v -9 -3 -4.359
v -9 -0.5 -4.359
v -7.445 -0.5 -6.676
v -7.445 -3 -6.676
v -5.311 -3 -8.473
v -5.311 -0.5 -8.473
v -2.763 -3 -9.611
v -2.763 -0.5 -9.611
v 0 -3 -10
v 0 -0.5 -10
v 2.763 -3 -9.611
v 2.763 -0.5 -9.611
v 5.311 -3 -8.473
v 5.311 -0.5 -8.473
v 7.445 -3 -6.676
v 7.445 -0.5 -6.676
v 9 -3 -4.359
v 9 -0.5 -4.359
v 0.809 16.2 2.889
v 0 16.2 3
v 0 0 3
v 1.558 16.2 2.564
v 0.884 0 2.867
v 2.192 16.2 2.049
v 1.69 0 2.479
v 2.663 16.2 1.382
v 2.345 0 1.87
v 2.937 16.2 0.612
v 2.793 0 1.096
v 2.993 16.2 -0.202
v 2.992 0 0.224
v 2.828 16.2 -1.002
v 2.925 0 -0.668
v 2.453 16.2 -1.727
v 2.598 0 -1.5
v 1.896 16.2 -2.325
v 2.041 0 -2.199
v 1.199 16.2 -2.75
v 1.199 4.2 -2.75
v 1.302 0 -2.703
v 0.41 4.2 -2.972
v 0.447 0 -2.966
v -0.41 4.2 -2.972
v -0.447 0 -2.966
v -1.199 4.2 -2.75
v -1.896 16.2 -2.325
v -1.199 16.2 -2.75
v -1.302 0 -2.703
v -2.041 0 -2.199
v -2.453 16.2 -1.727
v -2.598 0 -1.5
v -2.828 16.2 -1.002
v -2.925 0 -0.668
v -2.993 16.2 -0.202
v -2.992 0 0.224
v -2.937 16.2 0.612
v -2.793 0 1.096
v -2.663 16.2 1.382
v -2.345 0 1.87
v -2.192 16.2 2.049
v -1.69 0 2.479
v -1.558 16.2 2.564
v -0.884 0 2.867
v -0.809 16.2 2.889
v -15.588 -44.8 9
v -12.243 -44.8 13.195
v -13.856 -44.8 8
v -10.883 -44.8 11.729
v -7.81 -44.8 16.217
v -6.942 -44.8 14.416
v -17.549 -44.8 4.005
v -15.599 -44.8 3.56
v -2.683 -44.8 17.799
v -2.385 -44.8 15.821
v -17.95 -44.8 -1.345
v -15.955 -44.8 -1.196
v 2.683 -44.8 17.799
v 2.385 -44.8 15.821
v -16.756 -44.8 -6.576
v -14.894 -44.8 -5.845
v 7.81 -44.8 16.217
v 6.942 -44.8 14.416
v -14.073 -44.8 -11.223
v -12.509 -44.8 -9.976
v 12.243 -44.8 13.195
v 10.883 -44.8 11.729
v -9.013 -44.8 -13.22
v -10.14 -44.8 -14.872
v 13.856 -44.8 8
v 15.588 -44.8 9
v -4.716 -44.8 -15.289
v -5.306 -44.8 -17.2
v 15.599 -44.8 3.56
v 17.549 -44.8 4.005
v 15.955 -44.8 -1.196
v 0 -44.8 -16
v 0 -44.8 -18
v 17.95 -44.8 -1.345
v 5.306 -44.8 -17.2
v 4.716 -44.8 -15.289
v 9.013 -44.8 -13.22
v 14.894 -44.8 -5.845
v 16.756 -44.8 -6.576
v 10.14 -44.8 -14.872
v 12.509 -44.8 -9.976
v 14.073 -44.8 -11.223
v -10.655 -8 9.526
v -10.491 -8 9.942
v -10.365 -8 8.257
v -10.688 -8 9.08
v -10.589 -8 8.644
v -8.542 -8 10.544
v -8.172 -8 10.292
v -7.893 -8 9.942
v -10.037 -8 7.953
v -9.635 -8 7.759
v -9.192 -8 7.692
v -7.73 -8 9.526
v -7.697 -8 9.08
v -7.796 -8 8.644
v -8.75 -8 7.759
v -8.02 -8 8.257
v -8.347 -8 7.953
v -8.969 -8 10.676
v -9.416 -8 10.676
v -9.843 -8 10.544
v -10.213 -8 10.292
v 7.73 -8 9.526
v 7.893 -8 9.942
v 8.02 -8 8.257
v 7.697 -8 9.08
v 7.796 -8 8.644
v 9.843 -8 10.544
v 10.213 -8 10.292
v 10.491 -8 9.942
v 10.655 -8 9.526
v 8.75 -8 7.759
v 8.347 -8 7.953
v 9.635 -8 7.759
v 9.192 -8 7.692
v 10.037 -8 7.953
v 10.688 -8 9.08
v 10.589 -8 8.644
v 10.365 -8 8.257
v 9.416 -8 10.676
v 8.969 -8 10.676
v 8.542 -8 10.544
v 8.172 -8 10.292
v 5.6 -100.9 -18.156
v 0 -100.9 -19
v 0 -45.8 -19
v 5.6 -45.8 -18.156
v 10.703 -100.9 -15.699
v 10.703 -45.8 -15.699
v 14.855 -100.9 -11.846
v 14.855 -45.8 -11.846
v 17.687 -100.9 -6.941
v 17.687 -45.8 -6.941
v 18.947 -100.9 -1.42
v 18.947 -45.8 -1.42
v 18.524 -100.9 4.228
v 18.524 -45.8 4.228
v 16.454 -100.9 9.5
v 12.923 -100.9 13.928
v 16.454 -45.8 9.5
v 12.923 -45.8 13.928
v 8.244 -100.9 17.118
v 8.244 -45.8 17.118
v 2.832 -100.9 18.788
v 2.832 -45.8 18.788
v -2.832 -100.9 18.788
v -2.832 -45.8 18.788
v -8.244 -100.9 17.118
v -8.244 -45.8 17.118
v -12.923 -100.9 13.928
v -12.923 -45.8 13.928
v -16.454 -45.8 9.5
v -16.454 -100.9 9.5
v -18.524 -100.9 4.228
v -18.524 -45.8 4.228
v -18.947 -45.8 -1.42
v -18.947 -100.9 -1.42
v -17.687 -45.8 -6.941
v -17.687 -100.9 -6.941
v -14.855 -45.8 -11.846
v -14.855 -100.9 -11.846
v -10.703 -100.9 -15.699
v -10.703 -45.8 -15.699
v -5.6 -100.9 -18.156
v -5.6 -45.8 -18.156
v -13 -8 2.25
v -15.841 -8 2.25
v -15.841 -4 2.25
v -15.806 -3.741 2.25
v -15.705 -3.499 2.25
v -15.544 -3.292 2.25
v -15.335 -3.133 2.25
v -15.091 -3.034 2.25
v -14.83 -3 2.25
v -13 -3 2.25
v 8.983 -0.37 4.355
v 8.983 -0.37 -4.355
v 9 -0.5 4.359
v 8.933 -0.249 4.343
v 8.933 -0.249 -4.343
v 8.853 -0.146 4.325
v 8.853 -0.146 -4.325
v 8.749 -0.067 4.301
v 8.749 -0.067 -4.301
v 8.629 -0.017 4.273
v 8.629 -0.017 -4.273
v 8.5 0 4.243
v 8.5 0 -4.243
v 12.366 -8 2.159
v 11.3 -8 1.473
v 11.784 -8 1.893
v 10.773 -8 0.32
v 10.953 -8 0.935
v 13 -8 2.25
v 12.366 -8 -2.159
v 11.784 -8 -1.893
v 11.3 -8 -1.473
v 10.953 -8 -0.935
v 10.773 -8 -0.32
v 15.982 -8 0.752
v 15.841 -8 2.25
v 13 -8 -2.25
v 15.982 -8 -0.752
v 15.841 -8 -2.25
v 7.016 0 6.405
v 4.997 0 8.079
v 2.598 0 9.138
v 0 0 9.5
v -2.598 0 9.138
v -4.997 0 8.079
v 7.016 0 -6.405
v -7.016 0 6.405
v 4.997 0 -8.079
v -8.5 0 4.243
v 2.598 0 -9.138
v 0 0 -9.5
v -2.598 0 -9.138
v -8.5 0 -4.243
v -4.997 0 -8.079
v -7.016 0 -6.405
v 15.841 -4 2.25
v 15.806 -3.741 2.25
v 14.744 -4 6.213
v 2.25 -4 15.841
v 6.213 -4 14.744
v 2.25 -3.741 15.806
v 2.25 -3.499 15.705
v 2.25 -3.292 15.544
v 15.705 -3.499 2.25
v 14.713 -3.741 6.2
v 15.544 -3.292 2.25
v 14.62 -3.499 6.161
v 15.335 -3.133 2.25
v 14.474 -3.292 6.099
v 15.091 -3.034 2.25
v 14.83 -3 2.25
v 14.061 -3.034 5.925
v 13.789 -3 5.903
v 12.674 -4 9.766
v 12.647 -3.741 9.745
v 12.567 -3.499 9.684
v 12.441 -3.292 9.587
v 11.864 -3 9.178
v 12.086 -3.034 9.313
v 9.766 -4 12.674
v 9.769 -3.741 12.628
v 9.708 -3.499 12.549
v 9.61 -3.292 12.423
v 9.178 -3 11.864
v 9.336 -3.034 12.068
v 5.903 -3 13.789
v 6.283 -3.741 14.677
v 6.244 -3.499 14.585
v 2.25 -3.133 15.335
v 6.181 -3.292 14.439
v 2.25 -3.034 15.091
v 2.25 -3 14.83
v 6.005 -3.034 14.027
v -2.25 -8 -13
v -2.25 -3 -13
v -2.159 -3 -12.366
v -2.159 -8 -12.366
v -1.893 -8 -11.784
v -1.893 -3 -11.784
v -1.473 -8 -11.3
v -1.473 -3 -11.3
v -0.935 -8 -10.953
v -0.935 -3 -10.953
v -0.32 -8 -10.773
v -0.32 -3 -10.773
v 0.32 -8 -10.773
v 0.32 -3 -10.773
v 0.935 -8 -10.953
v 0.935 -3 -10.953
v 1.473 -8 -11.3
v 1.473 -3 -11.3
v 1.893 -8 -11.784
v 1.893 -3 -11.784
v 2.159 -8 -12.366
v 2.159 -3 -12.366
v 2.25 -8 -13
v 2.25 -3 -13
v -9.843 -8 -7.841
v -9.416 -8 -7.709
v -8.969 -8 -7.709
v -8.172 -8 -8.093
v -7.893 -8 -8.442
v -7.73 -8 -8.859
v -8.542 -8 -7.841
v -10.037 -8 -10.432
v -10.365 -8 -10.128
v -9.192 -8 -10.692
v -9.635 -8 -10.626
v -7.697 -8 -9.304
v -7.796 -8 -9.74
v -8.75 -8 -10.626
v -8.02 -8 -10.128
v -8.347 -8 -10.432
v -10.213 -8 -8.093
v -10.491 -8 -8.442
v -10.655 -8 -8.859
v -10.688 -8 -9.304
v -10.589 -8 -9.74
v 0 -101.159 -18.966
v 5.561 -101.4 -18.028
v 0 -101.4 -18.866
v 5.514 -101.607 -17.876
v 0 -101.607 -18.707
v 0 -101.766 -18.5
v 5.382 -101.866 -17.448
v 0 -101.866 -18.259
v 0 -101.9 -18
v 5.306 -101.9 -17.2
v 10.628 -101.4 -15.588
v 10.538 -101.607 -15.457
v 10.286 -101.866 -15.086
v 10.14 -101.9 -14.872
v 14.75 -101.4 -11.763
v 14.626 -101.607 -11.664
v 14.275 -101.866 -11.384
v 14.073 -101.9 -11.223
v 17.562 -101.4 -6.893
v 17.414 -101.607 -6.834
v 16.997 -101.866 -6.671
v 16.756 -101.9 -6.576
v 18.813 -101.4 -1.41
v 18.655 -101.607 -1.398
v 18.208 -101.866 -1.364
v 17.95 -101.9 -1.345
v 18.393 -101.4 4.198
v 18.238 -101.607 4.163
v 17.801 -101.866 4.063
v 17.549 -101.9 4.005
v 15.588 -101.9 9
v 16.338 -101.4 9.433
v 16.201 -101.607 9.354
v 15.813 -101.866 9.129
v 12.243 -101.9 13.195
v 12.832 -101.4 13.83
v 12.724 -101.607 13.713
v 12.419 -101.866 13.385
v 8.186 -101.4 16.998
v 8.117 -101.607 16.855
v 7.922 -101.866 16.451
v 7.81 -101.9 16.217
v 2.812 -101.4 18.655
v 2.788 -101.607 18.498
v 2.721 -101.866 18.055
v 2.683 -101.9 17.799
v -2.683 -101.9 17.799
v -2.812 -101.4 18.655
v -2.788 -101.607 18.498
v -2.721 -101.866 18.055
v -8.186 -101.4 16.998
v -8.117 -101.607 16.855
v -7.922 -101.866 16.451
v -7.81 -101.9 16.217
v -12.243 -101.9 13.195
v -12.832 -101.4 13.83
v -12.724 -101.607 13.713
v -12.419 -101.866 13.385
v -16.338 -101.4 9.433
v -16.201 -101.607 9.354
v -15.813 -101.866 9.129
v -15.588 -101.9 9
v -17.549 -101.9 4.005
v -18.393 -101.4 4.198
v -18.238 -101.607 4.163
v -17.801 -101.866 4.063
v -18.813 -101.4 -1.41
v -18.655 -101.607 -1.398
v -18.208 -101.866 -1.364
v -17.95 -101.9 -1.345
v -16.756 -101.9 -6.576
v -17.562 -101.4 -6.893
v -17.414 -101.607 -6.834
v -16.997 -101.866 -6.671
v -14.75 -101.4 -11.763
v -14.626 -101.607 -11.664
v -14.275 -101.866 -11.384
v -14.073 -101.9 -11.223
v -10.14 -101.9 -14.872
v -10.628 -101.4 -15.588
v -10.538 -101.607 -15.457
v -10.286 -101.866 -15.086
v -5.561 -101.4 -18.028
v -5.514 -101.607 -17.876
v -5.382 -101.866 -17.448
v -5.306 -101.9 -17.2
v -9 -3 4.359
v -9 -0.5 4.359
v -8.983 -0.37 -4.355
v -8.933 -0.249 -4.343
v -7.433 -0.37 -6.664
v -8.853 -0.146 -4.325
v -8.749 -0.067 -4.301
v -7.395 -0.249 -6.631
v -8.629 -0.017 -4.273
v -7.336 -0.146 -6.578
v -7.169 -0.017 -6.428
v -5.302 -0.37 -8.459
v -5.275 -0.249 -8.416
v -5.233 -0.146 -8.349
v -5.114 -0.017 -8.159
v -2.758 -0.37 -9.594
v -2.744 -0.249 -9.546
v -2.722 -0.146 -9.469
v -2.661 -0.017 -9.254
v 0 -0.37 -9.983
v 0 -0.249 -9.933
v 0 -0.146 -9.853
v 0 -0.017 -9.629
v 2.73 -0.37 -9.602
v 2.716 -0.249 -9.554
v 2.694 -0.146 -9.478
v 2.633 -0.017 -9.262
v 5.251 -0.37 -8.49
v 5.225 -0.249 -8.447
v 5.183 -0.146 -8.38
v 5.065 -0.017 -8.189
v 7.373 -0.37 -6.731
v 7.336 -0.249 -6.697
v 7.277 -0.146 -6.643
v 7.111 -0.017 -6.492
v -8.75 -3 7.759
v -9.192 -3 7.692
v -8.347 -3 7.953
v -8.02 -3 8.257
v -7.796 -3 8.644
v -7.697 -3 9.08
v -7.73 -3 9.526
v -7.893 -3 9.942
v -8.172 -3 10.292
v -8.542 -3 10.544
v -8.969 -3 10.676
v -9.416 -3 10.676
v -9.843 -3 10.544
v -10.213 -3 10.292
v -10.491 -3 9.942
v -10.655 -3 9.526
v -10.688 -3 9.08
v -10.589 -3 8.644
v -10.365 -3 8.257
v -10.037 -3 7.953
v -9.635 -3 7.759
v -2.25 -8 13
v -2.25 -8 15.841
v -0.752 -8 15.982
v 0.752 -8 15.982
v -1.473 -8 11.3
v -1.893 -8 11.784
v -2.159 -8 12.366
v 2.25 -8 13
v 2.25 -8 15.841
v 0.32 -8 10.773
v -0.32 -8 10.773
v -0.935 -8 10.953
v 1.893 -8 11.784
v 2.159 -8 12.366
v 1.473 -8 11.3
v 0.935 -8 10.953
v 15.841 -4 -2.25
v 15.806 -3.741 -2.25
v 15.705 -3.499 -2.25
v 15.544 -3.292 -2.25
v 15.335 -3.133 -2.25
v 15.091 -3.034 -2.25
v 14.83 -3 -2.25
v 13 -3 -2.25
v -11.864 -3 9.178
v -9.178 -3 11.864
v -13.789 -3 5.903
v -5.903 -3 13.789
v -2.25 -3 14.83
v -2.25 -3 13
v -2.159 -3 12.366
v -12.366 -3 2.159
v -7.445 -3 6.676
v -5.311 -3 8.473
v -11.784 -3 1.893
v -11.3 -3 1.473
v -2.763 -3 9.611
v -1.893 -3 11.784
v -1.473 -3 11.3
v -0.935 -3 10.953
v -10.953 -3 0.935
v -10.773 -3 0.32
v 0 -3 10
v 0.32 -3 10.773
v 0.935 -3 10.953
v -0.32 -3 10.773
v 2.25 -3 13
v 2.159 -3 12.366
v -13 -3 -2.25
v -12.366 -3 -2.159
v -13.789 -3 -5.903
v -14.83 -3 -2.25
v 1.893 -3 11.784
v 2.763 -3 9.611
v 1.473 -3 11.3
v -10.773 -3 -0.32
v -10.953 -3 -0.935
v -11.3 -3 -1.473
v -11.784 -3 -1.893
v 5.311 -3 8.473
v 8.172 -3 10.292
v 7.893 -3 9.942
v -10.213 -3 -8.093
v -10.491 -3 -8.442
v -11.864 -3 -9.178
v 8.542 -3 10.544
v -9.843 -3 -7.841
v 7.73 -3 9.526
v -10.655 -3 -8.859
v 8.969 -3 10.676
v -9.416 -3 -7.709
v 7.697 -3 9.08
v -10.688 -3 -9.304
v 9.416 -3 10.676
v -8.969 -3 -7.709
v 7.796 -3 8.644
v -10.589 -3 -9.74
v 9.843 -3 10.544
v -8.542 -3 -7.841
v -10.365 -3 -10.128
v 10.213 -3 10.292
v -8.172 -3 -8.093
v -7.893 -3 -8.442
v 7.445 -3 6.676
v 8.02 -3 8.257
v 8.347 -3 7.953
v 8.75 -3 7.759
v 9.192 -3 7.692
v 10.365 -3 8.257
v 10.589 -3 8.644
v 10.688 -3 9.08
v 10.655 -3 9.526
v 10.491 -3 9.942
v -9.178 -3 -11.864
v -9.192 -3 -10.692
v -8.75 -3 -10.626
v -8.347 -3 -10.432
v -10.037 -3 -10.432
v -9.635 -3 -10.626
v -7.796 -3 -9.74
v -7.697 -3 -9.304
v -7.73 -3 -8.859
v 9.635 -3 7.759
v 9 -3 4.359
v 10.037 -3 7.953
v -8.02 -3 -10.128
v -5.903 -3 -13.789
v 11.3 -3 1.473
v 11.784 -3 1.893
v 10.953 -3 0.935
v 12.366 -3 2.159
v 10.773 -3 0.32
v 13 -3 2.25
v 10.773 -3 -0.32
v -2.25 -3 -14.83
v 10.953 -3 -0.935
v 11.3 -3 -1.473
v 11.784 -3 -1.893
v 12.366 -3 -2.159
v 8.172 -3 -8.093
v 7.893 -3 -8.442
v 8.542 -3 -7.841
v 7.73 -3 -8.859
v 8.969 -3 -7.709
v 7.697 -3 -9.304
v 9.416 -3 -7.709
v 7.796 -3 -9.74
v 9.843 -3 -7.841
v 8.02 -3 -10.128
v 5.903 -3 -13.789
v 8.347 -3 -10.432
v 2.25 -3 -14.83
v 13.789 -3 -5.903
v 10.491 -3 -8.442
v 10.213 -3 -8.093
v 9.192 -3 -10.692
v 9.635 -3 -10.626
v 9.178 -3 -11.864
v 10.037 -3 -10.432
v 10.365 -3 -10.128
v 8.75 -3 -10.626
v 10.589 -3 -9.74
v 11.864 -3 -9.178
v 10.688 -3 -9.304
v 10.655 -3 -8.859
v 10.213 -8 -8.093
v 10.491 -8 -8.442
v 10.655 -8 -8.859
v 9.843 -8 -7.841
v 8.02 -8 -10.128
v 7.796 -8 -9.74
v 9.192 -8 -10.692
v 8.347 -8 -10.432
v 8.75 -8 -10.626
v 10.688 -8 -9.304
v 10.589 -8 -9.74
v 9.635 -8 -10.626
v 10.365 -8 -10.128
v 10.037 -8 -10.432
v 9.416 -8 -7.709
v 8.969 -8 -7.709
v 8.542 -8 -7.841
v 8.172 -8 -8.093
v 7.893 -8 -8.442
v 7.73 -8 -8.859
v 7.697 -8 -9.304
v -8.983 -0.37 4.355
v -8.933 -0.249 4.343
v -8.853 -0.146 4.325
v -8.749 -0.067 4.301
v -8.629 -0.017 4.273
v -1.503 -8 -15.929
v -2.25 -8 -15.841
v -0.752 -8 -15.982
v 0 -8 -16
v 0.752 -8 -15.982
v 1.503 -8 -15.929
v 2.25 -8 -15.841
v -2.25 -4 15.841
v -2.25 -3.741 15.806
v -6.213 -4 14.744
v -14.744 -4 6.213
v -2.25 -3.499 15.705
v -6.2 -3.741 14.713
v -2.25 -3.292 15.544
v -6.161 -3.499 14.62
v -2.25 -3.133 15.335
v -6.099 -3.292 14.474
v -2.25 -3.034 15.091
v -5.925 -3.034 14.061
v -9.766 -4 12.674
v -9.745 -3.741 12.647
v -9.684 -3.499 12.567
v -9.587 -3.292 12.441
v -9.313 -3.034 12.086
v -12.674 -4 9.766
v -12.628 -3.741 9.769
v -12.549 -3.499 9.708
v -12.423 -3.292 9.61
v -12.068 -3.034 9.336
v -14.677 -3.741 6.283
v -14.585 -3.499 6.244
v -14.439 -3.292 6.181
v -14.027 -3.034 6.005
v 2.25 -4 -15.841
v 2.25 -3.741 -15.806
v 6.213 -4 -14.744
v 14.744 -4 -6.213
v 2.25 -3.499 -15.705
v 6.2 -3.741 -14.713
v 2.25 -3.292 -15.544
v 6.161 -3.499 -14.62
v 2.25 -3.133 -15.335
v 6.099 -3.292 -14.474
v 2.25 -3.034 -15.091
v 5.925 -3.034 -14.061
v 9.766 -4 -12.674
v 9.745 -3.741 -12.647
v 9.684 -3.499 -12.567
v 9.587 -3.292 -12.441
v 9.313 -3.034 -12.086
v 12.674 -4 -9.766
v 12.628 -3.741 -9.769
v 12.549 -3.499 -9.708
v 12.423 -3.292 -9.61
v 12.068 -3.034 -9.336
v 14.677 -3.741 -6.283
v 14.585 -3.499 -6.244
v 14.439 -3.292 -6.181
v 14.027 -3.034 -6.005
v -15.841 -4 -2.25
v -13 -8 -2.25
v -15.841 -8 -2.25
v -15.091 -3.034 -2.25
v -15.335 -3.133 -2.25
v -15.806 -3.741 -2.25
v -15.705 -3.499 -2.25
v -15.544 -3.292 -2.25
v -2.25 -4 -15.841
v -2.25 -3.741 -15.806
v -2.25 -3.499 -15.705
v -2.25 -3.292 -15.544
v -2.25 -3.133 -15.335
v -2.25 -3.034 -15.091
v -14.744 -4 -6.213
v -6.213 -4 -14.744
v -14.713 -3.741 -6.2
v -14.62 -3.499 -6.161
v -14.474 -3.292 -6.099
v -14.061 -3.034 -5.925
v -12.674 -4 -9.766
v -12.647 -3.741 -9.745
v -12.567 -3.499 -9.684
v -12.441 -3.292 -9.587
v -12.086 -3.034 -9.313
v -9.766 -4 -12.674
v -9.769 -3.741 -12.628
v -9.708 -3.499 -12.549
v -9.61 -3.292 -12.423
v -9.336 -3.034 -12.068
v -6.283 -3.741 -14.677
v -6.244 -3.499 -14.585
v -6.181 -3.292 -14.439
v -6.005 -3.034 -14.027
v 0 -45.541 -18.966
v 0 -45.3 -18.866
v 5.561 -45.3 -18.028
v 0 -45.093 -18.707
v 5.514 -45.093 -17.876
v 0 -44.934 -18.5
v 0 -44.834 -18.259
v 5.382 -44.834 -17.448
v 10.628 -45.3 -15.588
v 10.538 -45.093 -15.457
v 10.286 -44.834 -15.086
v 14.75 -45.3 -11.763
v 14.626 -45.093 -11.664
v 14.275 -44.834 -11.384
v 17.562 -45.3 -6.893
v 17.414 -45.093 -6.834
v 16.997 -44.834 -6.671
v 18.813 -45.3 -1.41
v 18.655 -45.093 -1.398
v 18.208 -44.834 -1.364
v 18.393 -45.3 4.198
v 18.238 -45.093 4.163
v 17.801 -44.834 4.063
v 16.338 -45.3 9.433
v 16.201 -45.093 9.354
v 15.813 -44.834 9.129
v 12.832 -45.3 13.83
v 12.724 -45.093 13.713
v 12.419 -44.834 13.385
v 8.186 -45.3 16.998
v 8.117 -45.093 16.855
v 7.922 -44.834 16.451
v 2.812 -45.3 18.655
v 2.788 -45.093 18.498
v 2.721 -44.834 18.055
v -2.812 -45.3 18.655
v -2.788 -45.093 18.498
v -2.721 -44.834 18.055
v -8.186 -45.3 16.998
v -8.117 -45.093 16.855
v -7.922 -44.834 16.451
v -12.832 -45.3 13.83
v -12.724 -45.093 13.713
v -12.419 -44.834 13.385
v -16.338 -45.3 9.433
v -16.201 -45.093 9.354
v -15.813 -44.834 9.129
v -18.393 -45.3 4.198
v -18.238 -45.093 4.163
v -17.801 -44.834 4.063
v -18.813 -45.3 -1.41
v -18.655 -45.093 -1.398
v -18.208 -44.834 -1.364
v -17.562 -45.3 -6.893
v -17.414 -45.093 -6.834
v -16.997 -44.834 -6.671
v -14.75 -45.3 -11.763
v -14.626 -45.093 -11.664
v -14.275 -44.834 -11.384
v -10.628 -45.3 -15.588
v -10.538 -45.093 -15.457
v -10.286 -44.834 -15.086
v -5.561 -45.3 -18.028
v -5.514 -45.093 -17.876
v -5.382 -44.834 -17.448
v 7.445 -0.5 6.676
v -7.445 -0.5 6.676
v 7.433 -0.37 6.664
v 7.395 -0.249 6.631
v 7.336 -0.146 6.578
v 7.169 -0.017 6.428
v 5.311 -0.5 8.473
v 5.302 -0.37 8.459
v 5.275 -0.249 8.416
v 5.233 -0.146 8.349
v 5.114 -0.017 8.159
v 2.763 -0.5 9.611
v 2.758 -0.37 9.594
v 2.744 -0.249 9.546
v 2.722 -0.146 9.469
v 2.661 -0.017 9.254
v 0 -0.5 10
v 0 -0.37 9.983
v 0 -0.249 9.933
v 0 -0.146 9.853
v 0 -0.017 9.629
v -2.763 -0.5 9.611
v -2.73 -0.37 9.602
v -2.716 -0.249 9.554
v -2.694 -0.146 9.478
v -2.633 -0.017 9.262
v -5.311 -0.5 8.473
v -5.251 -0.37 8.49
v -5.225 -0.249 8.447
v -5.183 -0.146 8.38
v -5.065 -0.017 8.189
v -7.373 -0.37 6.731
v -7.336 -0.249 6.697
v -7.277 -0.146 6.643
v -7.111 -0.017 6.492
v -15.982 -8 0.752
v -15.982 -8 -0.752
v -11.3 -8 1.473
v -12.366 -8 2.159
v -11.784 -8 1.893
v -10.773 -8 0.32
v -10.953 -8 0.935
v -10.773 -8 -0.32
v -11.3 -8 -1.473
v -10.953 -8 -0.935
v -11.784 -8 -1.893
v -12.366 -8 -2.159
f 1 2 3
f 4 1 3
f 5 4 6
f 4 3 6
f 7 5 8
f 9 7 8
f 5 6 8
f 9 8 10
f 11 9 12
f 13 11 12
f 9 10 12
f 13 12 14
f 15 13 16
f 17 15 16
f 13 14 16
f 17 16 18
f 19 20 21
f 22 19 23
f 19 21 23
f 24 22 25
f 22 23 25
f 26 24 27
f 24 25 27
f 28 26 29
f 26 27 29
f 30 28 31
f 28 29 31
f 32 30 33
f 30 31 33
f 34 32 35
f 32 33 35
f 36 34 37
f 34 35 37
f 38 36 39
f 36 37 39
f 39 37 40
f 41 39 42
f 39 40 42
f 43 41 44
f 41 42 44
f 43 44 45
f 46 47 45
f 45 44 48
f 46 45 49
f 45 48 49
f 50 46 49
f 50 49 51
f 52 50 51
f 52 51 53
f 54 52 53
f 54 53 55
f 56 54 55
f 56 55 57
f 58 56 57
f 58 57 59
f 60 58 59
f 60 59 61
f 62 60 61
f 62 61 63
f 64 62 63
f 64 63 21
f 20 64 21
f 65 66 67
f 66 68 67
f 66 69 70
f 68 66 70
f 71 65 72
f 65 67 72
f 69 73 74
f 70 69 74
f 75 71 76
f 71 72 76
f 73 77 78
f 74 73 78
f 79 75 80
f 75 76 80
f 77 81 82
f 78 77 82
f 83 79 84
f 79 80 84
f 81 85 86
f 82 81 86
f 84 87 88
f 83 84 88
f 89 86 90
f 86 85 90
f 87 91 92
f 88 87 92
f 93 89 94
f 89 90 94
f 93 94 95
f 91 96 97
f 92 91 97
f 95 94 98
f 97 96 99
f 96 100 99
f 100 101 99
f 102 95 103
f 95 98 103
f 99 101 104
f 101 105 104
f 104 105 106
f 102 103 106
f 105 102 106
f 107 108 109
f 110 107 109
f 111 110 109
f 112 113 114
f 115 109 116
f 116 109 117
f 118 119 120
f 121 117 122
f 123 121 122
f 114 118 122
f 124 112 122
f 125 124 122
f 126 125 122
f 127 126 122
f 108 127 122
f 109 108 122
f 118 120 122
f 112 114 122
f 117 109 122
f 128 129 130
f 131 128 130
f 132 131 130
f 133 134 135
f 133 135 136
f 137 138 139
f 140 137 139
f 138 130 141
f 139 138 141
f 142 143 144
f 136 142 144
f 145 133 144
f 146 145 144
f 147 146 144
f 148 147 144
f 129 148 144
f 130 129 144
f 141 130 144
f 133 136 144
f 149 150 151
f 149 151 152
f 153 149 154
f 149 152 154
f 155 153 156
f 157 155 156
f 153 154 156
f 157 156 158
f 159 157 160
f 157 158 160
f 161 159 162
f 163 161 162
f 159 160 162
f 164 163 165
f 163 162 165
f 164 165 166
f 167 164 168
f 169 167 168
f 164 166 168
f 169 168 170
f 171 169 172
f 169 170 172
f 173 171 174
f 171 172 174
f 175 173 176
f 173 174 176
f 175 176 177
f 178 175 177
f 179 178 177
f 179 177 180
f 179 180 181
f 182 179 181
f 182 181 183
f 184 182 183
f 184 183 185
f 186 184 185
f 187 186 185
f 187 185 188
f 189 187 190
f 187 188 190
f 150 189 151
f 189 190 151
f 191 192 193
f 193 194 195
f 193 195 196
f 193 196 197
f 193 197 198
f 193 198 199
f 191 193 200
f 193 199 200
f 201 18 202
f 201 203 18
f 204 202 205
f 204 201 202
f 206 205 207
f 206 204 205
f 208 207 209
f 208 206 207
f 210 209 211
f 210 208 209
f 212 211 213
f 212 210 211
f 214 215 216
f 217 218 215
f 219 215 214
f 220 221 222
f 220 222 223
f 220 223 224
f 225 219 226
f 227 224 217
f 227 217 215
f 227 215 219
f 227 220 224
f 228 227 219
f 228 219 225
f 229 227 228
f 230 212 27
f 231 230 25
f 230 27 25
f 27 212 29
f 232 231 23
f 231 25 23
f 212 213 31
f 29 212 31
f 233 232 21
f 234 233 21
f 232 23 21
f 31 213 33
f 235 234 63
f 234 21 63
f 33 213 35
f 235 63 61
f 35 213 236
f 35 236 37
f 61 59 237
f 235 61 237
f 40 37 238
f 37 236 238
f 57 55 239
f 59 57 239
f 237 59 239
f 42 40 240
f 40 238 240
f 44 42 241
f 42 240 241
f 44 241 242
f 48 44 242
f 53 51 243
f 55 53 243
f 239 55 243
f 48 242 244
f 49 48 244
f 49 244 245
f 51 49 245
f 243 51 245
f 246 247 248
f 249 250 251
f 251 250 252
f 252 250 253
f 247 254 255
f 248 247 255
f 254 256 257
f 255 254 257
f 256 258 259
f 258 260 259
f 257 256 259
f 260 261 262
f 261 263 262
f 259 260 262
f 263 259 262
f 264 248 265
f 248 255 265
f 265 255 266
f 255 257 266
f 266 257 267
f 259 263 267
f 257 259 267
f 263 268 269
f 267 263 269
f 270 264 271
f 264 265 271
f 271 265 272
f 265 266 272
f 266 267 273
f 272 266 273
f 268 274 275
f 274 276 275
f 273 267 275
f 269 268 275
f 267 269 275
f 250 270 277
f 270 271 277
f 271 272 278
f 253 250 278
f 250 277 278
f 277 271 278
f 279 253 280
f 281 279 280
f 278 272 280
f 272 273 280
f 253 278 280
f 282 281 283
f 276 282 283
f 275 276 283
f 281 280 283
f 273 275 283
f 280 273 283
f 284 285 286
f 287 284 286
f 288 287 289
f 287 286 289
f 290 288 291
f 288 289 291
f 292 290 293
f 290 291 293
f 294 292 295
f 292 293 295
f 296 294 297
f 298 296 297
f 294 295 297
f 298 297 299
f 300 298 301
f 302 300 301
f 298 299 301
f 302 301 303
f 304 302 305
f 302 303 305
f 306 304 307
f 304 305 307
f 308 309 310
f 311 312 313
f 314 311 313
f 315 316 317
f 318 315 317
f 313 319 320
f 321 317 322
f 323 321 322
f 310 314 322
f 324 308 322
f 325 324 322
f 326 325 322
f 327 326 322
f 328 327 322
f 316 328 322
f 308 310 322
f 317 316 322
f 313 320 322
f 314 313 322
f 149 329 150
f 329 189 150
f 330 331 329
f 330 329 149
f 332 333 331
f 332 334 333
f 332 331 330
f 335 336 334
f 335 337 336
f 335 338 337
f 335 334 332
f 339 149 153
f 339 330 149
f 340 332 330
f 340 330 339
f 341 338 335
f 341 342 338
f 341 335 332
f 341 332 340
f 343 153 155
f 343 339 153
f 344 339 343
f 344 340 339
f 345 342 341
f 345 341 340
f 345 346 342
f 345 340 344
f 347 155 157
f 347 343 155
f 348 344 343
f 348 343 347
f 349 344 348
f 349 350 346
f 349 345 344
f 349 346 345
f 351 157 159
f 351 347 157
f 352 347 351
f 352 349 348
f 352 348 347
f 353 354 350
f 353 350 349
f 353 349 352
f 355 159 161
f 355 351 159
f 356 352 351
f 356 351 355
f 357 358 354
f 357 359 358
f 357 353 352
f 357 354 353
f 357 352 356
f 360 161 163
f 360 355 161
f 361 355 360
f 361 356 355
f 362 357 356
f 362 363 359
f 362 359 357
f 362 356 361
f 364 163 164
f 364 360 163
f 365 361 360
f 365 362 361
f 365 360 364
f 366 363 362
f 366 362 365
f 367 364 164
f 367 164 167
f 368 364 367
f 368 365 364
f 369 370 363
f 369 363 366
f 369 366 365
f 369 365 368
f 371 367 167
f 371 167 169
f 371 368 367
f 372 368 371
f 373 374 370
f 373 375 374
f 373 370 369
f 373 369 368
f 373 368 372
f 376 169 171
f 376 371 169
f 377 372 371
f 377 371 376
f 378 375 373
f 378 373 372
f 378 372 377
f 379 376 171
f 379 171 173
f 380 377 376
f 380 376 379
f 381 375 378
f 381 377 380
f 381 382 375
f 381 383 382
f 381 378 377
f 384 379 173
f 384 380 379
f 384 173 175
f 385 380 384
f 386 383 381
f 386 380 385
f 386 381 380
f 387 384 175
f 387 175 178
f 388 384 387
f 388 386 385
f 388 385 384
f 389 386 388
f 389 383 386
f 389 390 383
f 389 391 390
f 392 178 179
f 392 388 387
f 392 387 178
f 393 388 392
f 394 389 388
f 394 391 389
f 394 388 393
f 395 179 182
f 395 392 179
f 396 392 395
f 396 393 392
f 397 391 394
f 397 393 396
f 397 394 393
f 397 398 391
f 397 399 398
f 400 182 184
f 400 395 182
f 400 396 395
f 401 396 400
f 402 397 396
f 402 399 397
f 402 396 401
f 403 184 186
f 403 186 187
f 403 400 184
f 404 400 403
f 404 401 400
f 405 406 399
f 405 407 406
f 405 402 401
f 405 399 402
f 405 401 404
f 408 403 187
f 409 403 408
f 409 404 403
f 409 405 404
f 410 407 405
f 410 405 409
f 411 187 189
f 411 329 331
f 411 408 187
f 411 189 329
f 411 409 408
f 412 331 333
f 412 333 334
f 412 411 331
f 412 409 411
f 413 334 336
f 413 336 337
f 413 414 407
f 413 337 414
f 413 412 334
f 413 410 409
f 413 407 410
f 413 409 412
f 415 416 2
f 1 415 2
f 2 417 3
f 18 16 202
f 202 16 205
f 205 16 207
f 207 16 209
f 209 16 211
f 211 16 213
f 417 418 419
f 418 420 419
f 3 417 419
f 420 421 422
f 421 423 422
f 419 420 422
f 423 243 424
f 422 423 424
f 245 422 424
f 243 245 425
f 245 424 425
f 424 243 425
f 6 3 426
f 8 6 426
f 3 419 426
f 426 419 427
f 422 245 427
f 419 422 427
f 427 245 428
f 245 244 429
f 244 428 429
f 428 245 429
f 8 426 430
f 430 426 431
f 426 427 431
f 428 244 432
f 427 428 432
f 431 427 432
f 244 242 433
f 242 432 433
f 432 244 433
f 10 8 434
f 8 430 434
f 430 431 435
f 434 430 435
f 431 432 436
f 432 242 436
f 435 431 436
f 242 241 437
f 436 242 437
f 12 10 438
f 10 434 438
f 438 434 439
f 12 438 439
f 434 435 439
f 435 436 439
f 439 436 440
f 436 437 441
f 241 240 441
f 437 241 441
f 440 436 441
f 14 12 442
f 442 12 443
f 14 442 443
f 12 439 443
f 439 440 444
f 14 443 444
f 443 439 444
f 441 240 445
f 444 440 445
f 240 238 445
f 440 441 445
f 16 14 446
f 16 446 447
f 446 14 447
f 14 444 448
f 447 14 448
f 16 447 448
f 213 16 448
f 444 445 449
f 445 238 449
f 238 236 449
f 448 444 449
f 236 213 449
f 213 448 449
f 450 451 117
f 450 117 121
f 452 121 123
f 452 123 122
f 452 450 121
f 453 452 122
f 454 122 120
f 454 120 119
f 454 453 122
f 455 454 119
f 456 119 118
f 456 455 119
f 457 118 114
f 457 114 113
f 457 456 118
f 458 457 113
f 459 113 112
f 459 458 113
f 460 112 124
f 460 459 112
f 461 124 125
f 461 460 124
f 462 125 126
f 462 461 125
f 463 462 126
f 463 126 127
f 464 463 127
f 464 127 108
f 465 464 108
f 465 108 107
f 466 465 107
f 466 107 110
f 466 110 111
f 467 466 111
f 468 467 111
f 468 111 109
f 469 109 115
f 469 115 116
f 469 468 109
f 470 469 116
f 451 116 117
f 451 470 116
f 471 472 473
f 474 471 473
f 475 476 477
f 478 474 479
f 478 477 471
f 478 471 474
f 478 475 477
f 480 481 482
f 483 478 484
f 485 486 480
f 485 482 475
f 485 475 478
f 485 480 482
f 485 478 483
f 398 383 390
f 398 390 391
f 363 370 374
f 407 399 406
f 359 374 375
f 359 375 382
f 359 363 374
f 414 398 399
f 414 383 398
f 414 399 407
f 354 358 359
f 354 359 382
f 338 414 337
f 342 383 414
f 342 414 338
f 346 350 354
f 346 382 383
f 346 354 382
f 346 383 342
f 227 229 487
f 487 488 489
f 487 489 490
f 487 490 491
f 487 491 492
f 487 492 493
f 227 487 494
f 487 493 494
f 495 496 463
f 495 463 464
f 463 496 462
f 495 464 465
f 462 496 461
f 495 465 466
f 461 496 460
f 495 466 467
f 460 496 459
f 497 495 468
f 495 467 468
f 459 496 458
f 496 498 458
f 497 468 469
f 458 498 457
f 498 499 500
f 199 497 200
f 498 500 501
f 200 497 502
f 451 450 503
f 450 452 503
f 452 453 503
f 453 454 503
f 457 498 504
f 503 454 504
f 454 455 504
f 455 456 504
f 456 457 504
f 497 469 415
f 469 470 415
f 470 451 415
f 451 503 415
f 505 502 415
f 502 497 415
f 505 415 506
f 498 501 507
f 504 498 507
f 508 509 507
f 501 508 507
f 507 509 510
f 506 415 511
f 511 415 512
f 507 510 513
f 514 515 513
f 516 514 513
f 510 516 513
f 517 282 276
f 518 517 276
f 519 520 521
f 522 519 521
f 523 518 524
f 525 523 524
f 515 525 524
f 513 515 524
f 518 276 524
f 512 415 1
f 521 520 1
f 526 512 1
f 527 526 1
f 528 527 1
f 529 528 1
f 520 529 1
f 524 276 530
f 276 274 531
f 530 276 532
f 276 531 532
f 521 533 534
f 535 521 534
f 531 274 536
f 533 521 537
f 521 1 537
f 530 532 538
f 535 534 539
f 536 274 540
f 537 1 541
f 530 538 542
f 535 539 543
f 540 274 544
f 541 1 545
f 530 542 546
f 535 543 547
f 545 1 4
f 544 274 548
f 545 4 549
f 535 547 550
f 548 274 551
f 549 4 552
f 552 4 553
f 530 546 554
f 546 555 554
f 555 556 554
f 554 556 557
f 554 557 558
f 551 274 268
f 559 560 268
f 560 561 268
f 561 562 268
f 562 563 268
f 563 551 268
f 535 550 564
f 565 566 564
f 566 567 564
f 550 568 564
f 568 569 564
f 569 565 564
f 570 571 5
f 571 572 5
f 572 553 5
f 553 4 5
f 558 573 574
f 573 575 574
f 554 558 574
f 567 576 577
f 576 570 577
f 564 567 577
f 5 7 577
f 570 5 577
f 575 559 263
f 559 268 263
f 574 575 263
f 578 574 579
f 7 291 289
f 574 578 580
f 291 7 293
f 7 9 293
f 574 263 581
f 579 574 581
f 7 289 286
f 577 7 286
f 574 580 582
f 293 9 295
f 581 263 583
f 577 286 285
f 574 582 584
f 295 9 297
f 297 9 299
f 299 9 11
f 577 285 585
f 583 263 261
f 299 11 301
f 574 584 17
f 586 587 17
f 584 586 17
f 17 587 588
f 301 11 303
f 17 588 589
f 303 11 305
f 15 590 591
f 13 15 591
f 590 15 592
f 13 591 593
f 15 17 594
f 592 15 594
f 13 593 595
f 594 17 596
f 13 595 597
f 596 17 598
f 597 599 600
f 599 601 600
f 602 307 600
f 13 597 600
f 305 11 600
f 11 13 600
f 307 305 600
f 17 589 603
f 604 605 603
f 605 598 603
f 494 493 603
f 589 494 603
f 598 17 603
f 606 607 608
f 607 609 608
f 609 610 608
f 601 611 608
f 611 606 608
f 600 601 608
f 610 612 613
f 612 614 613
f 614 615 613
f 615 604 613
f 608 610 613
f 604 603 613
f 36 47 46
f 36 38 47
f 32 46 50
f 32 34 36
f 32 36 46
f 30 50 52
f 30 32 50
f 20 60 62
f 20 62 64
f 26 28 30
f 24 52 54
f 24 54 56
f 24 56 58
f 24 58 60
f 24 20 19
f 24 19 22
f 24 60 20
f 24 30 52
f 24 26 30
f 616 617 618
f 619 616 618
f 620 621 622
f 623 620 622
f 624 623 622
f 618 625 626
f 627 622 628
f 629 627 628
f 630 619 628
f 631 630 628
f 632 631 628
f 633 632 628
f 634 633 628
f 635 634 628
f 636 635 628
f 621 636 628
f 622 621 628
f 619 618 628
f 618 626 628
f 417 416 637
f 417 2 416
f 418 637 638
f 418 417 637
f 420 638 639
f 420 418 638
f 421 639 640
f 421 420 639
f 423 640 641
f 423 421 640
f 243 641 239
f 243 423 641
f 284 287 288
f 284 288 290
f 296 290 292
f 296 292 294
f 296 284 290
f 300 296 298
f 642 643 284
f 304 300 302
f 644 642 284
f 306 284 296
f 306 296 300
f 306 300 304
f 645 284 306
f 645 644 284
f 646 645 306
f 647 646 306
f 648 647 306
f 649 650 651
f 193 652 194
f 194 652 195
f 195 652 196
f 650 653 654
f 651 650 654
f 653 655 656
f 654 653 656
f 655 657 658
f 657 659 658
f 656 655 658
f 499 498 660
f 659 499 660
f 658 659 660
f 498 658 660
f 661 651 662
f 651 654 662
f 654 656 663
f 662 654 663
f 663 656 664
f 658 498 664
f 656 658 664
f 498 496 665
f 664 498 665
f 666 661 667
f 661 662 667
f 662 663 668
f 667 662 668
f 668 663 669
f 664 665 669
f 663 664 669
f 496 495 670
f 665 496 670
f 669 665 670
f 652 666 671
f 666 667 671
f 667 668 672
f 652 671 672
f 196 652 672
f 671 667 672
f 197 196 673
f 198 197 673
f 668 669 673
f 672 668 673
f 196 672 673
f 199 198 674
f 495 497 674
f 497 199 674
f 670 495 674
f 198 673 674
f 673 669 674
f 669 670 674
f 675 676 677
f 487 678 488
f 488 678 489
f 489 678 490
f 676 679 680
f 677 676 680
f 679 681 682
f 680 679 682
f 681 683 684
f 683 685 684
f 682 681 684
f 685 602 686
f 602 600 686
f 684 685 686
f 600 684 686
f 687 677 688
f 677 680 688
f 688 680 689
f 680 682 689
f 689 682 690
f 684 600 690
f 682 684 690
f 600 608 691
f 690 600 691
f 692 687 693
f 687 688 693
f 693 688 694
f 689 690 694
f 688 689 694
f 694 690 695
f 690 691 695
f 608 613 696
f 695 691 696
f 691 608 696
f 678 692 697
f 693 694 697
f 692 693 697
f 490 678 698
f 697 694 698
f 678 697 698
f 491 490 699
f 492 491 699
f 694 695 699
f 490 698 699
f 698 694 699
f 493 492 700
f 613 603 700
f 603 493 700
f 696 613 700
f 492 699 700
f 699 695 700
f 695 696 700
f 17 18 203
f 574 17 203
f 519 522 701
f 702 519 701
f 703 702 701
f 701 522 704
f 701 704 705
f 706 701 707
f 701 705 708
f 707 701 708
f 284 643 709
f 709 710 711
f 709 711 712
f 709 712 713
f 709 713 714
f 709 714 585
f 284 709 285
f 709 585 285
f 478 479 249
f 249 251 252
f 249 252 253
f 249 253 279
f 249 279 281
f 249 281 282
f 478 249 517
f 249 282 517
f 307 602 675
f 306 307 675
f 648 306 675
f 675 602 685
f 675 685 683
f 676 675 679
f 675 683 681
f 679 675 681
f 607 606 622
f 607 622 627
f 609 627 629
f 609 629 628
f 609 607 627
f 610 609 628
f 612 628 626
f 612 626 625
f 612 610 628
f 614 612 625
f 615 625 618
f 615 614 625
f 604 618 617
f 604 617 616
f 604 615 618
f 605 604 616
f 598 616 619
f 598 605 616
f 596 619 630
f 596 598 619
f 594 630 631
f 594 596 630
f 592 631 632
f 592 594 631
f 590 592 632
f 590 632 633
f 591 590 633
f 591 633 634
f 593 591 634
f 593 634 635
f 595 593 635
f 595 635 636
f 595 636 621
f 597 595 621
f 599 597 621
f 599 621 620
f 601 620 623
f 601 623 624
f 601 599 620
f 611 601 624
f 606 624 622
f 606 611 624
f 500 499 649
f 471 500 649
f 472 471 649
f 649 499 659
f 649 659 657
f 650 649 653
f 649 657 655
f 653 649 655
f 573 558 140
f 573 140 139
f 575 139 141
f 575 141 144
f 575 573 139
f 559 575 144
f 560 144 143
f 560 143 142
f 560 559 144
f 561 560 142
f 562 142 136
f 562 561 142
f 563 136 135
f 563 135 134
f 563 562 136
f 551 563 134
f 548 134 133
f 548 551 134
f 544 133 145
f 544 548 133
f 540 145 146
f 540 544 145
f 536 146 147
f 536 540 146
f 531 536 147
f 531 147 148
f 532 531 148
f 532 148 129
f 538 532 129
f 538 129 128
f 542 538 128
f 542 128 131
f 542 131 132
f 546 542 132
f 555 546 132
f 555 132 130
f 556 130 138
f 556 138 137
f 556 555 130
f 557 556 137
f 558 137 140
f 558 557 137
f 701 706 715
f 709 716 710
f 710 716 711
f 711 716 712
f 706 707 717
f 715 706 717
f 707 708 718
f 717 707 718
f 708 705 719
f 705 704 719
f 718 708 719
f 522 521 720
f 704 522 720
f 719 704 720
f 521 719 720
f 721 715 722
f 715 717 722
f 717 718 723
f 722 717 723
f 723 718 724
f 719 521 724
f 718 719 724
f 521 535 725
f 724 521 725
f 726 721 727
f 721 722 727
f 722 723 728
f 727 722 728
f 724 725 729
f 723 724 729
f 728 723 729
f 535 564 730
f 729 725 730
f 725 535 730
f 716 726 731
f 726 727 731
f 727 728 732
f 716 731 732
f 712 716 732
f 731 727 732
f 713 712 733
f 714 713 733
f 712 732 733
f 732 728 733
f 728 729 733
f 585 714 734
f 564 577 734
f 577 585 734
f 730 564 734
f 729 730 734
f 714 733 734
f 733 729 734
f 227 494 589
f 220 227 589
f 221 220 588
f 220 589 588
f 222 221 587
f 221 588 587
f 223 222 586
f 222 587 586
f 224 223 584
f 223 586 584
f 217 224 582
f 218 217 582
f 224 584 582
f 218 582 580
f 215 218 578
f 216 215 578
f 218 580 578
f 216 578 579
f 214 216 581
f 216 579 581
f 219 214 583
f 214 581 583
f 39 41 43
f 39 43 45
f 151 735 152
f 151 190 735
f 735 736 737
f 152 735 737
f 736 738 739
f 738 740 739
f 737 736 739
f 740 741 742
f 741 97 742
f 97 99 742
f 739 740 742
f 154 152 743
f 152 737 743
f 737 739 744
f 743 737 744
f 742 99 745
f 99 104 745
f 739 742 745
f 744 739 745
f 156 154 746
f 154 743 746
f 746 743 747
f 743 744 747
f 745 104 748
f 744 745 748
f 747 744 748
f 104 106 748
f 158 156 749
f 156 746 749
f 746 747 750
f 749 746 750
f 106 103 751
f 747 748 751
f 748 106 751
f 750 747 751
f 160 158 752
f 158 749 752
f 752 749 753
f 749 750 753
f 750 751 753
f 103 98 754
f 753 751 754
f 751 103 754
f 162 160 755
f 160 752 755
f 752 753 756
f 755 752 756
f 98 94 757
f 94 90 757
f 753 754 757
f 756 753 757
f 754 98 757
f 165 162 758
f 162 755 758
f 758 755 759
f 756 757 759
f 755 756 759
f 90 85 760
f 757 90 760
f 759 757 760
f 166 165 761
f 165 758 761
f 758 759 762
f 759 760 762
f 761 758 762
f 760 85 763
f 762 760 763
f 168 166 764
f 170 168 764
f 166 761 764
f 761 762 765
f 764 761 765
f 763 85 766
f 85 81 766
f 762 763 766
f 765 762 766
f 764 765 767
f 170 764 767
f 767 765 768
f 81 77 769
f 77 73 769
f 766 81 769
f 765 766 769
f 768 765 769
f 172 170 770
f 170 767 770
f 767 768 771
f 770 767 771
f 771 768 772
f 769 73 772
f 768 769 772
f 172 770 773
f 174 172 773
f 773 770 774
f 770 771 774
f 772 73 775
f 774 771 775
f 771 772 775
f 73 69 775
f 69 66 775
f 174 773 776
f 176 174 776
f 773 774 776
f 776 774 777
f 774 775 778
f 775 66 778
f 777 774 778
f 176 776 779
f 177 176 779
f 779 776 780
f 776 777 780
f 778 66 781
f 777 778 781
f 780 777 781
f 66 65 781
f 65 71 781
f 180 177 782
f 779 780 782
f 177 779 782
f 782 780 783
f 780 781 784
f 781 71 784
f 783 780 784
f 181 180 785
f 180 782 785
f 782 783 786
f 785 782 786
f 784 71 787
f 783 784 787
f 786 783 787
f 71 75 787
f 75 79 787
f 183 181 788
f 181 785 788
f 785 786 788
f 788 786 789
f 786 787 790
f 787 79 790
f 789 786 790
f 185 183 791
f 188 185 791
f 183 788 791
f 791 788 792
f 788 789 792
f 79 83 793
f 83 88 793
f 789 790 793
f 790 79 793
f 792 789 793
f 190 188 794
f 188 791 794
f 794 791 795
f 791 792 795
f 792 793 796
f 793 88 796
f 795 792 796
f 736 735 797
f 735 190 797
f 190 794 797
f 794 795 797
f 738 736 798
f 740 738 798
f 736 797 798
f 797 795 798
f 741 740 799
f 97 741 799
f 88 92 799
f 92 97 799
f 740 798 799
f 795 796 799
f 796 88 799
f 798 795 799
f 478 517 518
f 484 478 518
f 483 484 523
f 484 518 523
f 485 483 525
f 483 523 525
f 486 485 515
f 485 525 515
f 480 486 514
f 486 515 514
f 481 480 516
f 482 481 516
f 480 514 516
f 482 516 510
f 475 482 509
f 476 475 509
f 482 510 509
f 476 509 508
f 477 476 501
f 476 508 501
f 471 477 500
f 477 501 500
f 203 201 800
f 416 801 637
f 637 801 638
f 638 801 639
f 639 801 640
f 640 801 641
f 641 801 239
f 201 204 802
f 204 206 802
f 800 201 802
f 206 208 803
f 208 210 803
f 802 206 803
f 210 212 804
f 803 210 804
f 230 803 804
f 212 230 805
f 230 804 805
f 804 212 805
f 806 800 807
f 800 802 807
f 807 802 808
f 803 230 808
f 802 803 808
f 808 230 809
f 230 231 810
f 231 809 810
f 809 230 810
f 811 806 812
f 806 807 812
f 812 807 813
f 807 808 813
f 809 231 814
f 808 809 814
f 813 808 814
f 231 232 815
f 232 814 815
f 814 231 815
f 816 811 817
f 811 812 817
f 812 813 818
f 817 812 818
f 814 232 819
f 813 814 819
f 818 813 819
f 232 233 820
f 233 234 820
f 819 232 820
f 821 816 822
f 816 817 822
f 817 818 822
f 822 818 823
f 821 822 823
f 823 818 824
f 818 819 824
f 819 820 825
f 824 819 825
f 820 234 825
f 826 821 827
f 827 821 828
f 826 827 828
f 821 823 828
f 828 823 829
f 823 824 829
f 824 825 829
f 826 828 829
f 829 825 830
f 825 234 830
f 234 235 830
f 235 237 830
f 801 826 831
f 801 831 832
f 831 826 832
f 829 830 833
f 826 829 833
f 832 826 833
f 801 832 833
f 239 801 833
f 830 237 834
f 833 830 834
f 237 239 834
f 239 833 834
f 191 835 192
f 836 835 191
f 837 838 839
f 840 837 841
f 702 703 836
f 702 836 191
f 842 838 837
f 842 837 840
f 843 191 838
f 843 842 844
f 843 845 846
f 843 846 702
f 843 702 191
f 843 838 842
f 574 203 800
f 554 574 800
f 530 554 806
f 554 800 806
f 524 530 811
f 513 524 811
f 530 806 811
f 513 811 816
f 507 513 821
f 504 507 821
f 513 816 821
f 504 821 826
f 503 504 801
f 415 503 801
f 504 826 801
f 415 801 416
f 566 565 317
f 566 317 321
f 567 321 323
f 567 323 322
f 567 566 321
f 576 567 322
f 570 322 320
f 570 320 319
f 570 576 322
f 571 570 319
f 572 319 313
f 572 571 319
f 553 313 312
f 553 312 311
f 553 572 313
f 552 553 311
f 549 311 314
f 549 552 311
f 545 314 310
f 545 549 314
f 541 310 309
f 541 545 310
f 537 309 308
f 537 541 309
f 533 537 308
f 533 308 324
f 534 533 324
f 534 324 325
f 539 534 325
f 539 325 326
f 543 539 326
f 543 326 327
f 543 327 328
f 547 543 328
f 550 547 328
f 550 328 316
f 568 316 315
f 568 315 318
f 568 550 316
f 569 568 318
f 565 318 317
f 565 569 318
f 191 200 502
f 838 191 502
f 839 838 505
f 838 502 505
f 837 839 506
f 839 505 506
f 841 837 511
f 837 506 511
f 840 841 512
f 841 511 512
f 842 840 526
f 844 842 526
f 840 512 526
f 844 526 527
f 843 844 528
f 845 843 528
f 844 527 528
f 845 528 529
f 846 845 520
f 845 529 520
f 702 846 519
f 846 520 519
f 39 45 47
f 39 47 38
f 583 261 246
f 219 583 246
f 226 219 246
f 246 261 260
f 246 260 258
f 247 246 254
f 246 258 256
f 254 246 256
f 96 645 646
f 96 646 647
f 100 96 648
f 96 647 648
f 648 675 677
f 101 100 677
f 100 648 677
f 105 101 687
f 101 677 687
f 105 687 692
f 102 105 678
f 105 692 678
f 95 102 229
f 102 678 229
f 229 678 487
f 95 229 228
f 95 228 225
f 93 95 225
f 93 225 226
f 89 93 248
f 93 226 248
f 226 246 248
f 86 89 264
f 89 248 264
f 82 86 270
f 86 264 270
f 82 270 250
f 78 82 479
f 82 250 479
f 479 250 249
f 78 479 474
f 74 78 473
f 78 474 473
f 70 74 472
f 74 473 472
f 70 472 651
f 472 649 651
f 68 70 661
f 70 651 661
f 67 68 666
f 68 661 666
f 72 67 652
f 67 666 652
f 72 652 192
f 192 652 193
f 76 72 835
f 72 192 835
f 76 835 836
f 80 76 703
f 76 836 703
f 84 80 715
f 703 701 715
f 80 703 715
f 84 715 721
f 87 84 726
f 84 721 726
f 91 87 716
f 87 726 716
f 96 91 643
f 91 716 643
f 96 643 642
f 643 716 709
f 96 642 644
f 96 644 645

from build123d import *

# Parameters (mm, degrees)
SKETCH3_R           = 3
BOSS_EXTRUDE2_DEPTH = 16.2
CUT_EXTRUDE1_START  = -12
CUT_EXTRUDE1_DEPTH  = 12
BOSS_EXTRUDE3_DEPTH = 3
SKETCH7_R           = 16
BOSS_EXTRUDE4_DEPTH = 41.8
SKETCH8_R           = 19
BOSS_EXTRUDE5_DEPTH = 57.1
FILLET1_R           = 1
FILLET2_R           = 0.5
SKETCH9_R           = 1.5
CUT_EXTRUDE2_DEPTH  = 5
FILLET3_R           = 1


with BuildPart() as part:
    # Sketch3 → Boss-Extrude2 (new body)
    with BuildSketch(Plane(origin=(0, 0, 0), x_dir=(1, 0, 0), z_dir=(0, 1, 0))):
        with Locations(Location((0, 0, 0), (0, 0, 270))):
            Circle(SKETCH3_R)
    extrude(amount=BOSS_EXTRUDE2_DEPTH)

    # Sketch4 → Cut-Extrude1 (cut)
    with BuildSketch(Plane(origin=(0, 16.2, 0), x_dir=(1, 0, 0), z_dir=(0, 1, 0)).offset(CUT_EXTRUDE1_START)):
        with BuildLine():
            Line((-1.198957881, 2.75), (1.198957881, 2.75))
            ThreePointArc((1.198957881, 2.75), (0, 3), (-1.198957881, 2.75))
        make_face()
    extrude(amount=CUT_EXTRUDE1_DEPTH, mode=Mode.SUBTRACT)

    # Sketch5 → Boss-Extrude3 (add)
    with BuildSketch(Plane(origin=(0, 0, 0), x_dir=(1, 0, 0), z_dir=(0, 1, 0))):
        with BuildLine():
            Line((-9, -4.358898944), (-9, 4.358898944))
            ThreePointArc((-9, 4.358898944), (0, 10), (9, 4.358898944))
            Line((9, 4.358898944), (9, -4.358898944))
            ThreePointArc((9, -4.358898944), (0, -10), (-9, -4.358898944))
        make_face()
    extrude(amount=-BOSS_EXTRUDE3_DEPTH)

    # Sketch7 → Boss-Extrude4 (add)
    with BuildSketch(Plane(origin=(0, -3, 0), x_dir=(-1, 0, 0), z_dir=(0, -1, 0))):
        with Locations(Location((0, 0, 0), (0, 0, 90))):
            Circle(SKETCH7_R)
    extrude(amount=BOSS_EXTRUDE4_DEPTH)

    # Sketch8 → Boss-Extrude5 (add)
    with BuildSketch(Plane(origin=(0, -44.8, 0), x_dir=(-1, 0, 0), z_dir=(0, -1, 0))):
        with Locations(Location((0, 0, 0), (0, 0, 90))):
            Circle(SKETCH8_R)
    extrude(amount=BOSS_EXTRUDE5_DEPTH)

    # Fillet1
    fillet1_edges = [part.edges().sort_by_distance(p)[0] for p in [
        (0, -3, 16),
        (0, -44.8, 19),
    ]]
    fillet(fillet1_edges, radius=FILLET1_R)

    # Fillet2
    fillet2_edges = [part.edges().sort_by_distance(p)[0] for p in [
        (0, 0, -10),
        (-9, 0, 0),
        (0, 0, 10),
        (9, 0, 0),
    ]]
    fillet(fillet2_edges, radius=FILLET2_R)

    # Sketch9 → Cut-Extrude2 (cut)
    with BuildSketch(Plane(origin=(0, -3, 0), x_dir=(-1, 0, 0), z_dir=(0, -1, 0))):
        with Locations(Location((9.192388155, -9.192388155, 0), (0, 0, 90))):
            Circle(SKETCH9_R)
        with Locations(Location((-9.192388155, -9.192388155, 0), (0, 0, 90))):
            Circle(SKETCH9_R)
        with Locations(Location((-9.192388155, 9.192388155, 0), (0, 0, 90))):
            Circle(SKETCH9_R)
        with Locations(Location((9.192388155, 9.192388155, 0), (0, 0, 90))):
            Circle(SKETCH9_R)
        with BuildLine():
            Line((-17.5, -2.25), (-17.5, 2.25))
            Line((-17.5, 2.25), (-13, 2.25))
            ThreePointArc((-13, 2.25), (-10.75, 0), (-13, -2.25))
            Line((-13, -2.25), (-17.5, -2.25))
        make_face()
        with BuildLine():
            Line((2.25, -17.5), (-2.25, -17.5))
            Line((-2.25, -17.5), (-2.25, -13))
            ThreePointArc((-2.25, -13), (0, -10.75), (2.25, -13))
            Line((2.25, -13), (2.25, -17.5))
        make_face()
        with BuildLine():
            Line((-2.25, 17.5), (2.25, 17.5))
            Line((2.25, 17.5), (2.25, 13))
            ThreePointArc((2.25, 13), (0, 10.75), (-2.25, 13))
            Line((-2.25, 13), (-2.25, 17.5))
        make_face()
        with BuildLine():
            Line((17.5, 2.25), (17.5, -2.25))
            Line((17.5, -2.25), (13, -2.25))
            ThreePointArc((13, -2.25), (10.75, 0), (13, 2.25))
            Line((13, 2.25), (17.5, 2.25))
        make_face()
    extrude(amount=CUT_EXTRUDE2_DEPTH, mode=Mode.SUBTRACT)

    # Fillet3
    fillet3_edges = [part.edges().sort_by_distance(p)[0] for p in [
        (0, -101.9, 19),
    ]]
    fillet(fillet3_edges, radius=FILLET3_R)


solid = part.part
